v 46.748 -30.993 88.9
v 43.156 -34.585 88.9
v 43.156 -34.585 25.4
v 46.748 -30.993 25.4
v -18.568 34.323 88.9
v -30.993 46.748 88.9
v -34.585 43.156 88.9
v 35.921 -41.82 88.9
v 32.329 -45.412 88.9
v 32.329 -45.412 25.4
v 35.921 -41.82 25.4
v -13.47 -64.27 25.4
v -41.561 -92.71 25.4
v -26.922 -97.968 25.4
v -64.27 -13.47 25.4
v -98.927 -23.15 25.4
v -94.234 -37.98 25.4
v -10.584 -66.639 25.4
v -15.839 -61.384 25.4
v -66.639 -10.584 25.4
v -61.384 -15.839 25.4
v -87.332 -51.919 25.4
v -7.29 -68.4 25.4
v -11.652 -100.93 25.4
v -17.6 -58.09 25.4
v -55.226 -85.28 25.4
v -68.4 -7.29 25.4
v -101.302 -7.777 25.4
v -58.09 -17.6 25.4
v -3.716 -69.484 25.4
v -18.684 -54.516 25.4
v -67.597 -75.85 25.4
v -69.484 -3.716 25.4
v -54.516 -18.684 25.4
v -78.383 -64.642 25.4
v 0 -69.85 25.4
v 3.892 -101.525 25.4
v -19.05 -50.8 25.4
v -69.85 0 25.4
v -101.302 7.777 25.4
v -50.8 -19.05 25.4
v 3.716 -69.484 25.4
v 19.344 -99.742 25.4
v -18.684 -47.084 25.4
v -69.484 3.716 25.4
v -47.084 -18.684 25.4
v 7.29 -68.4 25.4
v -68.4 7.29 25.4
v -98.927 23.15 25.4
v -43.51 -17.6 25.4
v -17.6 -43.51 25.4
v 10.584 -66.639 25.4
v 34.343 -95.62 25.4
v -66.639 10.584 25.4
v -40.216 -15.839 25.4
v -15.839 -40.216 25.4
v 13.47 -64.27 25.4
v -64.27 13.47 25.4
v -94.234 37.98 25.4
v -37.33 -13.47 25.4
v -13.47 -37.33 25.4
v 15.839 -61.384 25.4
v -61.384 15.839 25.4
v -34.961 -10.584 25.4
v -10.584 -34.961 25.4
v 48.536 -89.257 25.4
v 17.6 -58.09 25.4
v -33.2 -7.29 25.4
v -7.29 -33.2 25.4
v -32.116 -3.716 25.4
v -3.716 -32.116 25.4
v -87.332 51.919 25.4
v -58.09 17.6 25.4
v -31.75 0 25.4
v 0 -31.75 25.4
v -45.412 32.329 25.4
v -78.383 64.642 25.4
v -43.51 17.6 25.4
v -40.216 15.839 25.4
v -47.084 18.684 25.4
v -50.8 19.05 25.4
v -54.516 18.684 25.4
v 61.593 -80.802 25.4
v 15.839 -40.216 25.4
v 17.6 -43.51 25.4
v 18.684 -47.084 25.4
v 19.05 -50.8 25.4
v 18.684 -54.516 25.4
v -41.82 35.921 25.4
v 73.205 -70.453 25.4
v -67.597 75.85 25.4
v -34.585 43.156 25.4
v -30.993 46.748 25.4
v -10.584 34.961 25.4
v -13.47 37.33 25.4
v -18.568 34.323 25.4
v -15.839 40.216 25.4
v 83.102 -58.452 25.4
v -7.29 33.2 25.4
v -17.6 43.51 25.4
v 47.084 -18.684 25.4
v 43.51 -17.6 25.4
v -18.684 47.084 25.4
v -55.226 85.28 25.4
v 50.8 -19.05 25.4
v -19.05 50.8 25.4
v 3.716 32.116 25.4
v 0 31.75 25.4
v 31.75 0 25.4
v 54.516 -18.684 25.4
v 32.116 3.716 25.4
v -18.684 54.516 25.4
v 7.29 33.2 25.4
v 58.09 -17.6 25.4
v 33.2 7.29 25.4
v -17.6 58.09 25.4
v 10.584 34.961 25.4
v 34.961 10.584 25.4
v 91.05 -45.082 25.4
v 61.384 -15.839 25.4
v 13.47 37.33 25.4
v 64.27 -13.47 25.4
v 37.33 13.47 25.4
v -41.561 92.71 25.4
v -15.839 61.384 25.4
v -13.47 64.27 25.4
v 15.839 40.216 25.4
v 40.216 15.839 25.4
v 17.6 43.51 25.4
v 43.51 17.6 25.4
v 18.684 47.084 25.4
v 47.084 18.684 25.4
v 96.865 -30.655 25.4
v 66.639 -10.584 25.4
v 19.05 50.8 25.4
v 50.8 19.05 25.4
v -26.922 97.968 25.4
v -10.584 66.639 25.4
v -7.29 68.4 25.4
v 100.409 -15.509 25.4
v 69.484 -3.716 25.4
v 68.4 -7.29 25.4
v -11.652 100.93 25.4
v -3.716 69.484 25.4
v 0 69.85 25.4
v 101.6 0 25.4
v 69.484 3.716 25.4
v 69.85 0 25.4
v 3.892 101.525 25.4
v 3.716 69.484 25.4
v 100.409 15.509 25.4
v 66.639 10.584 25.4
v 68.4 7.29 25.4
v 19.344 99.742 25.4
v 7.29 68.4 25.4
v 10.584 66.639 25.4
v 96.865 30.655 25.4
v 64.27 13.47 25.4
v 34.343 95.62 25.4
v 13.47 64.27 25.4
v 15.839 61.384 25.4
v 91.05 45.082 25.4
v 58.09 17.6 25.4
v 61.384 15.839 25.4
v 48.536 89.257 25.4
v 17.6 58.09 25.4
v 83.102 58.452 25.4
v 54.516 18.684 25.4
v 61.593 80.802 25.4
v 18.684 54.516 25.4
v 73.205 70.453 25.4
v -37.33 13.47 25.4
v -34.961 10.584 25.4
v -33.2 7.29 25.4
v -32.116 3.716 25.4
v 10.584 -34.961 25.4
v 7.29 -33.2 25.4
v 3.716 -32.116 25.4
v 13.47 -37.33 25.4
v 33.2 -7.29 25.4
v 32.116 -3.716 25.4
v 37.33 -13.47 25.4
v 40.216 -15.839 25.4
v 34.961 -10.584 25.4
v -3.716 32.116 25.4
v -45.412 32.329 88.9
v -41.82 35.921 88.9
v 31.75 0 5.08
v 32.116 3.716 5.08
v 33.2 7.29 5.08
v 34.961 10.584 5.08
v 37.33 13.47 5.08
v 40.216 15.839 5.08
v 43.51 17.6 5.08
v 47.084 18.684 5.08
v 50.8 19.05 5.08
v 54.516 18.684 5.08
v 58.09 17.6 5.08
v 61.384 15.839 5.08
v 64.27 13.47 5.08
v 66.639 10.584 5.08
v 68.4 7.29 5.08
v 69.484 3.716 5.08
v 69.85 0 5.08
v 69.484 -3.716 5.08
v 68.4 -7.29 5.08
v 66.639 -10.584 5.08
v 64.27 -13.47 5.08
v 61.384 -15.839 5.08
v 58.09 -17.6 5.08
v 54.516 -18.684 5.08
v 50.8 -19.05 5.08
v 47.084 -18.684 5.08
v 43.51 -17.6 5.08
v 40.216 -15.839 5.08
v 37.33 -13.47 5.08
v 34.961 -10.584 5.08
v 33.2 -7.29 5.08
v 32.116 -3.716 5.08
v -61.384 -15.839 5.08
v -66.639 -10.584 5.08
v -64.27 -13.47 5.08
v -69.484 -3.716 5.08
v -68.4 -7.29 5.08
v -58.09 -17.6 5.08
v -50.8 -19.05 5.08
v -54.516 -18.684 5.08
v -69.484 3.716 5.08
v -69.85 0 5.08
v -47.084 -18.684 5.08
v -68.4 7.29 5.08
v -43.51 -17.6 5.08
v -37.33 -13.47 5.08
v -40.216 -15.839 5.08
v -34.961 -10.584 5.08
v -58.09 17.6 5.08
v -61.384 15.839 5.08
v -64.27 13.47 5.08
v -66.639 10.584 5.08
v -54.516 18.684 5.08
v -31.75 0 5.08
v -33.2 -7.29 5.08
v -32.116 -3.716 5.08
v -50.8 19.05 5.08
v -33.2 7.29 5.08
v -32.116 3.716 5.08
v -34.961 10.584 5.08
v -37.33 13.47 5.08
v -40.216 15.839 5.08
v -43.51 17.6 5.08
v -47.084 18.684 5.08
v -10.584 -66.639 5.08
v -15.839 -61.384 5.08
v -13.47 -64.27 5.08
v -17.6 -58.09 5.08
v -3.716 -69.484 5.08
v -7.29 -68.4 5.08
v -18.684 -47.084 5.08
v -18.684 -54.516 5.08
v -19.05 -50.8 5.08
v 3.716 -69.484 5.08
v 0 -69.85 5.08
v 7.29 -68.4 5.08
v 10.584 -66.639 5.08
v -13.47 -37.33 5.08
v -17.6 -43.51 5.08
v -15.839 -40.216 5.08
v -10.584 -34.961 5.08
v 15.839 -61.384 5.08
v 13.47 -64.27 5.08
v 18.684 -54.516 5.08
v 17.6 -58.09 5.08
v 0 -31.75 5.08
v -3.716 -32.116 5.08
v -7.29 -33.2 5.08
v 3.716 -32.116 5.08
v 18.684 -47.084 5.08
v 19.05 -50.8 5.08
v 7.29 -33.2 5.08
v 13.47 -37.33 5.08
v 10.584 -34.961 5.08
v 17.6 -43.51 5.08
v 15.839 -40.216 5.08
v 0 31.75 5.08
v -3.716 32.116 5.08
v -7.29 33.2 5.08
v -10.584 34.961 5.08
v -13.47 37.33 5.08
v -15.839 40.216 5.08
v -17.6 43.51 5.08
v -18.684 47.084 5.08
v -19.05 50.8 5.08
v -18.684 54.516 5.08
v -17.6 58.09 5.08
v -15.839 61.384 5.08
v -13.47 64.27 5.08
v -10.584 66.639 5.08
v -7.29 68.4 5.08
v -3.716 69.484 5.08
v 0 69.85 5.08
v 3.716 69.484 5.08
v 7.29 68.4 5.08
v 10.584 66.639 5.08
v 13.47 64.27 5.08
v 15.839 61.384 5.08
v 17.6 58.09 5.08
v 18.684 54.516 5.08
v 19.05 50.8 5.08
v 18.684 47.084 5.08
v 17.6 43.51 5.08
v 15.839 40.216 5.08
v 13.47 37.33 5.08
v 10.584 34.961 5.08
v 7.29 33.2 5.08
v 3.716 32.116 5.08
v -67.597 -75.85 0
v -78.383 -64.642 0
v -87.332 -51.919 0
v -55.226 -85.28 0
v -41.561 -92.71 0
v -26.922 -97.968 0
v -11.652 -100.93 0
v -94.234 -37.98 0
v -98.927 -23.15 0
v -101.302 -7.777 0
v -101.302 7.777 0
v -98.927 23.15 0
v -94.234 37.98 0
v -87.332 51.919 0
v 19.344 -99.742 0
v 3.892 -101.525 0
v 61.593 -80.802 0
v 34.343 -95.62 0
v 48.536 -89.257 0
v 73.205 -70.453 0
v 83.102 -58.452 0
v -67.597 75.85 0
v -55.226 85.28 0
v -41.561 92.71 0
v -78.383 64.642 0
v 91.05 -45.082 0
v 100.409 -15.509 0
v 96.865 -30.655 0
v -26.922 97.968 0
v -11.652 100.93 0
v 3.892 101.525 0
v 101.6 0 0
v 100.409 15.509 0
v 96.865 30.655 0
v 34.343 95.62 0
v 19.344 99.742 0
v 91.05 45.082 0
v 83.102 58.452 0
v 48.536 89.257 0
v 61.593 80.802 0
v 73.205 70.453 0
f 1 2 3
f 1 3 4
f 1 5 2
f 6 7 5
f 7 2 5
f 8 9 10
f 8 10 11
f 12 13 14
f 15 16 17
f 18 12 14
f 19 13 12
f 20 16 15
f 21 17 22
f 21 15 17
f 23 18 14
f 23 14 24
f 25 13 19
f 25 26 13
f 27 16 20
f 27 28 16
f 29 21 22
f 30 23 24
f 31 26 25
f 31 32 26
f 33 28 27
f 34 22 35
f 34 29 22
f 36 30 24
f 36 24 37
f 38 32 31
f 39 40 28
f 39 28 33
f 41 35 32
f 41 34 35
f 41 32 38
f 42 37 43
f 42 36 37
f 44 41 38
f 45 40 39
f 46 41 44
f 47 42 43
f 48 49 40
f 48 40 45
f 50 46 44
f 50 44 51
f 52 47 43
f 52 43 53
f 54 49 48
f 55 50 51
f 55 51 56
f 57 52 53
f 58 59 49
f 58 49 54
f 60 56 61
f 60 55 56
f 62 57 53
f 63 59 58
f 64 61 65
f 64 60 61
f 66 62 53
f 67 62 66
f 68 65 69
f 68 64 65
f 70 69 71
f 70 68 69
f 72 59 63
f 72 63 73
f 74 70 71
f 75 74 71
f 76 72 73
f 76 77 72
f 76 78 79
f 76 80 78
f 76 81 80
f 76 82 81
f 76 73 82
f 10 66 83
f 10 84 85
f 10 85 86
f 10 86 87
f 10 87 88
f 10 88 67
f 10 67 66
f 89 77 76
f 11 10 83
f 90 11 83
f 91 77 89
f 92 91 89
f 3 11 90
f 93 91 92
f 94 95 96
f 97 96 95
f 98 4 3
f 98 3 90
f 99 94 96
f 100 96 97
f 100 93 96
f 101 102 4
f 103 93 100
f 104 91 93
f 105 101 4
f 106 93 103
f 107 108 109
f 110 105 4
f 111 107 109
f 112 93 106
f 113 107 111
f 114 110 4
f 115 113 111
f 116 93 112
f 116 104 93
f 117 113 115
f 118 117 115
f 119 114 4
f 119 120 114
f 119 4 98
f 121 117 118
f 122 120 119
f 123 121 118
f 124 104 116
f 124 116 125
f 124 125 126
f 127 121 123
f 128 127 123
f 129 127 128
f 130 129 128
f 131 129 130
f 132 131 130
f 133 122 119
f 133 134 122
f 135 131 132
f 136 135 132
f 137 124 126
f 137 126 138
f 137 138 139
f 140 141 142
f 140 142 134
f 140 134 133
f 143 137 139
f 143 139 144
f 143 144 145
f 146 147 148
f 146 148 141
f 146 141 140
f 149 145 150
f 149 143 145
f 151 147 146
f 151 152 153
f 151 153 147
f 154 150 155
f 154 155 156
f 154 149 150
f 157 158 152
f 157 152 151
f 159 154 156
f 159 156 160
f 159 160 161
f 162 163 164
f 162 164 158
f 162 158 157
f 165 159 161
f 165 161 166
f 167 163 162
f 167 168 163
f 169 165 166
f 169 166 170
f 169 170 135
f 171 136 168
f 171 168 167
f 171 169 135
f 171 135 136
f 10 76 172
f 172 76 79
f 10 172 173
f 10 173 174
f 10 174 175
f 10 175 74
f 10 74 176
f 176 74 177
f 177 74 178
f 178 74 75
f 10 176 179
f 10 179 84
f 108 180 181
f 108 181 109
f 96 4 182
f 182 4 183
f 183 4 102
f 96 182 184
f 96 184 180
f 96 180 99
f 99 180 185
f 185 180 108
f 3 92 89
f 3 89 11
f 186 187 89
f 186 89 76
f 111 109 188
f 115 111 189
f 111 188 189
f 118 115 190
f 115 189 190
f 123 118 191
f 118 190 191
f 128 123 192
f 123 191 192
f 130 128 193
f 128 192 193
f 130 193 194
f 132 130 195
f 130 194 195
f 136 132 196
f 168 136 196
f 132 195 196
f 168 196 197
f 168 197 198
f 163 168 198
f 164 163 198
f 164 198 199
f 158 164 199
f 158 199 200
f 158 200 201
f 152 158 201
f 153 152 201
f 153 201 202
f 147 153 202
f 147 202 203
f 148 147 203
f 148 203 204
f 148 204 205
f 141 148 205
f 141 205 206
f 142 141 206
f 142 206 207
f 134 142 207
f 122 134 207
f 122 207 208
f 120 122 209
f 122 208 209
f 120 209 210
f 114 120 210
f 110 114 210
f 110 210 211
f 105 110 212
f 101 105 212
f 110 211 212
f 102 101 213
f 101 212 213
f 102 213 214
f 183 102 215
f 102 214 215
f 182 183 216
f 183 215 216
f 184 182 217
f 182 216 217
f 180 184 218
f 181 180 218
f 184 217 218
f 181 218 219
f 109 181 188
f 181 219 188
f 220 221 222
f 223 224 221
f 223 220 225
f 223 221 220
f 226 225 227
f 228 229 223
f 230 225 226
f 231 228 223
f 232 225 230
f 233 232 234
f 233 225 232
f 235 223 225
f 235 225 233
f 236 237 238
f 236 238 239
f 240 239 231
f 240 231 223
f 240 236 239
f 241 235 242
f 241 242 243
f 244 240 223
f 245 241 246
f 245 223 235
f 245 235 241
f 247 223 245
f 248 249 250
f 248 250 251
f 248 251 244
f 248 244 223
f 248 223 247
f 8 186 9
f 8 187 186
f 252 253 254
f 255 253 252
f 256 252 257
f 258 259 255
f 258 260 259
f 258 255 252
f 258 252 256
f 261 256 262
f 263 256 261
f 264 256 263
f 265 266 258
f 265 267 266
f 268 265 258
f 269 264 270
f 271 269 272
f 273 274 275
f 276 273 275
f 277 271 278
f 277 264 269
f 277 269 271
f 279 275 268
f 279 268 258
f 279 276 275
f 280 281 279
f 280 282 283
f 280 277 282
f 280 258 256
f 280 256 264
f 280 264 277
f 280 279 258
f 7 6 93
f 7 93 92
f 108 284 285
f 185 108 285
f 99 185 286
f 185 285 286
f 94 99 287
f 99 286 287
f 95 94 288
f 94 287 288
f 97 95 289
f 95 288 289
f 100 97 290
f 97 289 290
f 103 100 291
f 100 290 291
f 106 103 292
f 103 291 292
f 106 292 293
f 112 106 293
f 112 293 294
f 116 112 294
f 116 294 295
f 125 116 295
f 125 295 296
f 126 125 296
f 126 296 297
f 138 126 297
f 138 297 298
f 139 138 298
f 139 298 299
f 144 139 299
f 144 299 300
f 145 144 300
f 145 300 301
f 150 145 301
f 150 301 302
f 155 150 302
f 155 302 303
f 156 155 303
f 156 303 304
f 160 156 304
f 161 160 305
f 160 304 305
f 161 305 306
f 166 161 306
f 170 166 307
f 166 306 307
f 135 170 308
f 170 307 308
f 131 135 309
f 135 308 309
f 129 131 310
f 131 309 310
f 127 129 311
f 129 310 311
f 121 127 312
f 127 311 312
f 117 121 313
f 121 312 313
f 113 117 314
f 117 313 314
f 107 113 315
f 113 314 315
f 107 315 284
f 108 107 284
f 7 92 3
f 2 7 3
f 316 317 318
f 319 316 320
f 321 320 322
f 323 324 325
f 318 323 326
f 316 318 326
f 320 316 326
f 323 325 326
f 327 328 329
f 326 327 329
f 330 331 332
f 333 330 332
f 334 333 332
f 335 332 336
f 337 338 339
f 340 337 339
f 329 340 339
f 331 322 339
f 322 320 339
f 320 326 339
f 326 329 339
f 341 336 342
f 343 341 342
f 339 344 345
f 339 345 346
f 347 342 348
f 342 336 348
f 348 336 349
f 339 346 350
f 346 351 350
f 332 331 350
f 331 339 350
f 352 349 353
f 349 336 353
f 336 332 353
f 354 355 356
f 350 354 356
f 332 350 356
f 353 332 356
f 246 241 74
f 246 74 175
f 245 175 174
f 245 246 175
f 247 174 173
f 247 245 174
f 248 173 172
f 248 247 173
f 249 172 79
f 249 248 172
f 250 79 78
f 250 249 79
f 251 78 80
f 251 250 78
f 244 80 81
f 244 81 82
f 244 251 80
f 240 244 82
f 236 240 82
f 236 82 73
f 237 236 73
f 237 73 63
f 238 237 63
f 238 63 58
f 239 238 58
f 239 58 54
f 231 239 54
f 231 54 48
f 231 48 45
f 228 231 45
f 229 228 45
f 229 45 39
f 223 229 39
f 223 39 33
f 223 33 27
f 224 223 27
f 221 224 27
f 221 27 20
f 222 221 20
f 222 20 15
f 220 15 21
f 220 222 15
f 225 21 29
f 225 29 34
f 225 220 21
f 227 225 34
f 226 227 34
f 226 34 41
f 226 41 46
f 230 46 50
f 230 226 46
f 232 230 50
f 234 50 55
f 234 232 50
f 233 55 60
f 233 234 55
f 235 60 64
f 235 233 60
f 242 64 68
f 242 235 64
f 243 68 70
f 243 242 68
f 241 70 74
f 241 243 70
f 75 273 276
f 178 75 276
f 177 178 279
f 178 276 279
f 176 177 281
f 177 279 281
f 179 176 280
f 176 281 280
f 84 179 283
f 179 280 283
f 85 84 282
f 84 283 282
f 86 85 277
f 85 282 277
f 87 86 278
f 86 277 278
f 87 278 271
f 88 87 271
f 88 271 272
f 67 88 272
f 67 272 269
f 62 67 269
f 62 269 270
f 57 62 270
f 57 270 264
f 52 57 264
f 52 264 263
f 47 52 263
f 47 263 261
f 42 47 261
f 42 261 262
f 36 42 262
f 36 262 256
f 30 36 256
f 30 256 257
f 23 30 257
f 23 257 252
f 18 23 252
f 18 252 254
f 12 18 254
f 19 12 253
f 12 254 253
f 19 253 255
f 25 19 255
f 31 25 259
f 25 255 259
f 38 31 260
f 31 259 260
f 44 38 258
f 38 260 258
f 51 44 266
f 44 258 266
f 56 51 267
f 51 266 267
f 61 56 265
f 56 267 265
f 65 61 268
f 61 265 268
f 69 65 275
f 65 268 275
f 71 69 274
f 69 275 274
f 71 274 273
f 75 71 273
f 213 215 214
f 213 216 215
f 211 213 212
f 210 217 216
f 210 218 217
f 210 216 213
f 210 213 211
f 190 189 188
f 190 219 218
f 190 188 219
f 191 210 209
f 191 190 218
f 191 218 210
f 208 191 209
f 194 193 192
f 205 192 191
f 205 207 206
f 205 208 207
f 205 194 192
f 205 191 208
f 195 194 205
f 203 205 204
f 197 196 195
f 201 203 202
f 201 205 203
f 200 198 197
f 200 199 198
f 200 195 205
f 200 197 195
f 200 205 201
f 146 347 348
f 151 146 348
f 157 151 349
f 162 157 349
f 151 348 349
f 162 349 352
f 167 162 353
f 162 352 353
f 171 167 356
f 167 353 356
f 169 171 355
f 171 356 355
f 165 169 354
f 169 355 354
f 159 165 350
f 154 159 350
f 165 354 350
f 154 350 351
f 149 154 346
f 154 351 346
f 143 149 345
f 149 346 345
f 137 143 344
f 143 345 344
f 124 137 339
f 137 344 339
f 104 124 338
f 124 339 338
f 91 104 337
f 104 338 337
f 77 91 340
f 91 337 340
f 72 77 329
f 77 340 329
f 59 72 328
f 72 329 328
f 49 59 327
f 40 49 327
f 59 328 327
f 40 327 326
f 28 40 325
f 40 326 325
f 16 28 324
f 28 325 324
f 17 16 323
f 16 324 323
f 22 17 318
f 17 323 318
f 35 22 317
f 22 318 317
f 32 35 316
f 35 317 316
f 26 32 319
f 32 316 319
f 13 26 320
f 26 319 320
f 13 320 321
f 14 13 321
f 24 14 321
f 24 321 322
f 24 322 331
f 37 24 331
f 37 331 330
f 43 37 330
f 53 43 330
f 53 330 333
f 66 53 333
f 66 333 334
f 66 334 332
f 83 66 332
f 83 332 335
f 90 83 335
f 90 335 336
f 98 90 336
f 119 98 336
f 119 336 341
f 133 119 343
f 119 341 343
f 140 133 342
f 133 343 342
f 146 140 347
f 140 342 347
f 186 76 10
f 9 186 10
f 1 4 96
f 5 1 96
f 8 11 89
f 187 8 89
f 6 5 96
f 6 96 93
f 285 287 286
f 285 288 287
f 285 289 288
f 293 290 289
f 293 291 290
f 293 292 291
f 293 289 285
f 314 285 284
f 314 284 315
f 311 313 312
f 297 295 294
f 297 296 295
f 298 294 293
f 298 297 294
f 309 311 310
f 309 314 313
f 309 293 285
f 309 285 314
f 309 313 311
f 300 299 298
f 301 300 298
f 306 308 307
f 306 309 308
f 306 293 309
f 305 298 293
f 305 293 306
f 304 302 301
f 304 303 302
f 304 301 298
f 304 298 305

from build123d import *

# Parameters (mm, degrees)
F0_R     = 101.6
F0_R_2   = 19.05
F1_DEPTH = 25.4
F2_R     = 19.05
F3_DEPTH = 5.08
F5_DEPTH = 63.5


with BuildPart() as f1:
    # F0 (on Top) → F1 (new body)
    with BuildSketch(Plane.XY):
        Circle(F0_R)
        with BuildLine():
            ThreePointArc((19.05, -50.8), (-13.4703841816, -64.2703841816), (0, -31.75))
            ThreePointArc((0, -31.75), (13.4703841816, -37.3296158184), (19.05, -50.8))
        make_face(mode=Mode.SUBTRACT)
        with Locations((-50.8, 0)):
            Circle(F0_R_2, mode=Mode.SUBTRACT)
        with BuildLine():
            ThreePointArc((69.85, 0), (50.8, -19.05), (31.75, 0))
            ThreePointArc((31.75, 0), (50.8, 19.05), (69.85, 0))
        make_face(mode=Mode.SUBTRACT)
        with BuildLine():
            ThreePointArc((19.05, 50.8), (13.4703841816, 37.3296158184), (0, 31.75))
            ThreePointArc((0, 31.75), (-13.4703841816, 64.2703841816), (19.05, 50.8))
        make_face(mode=Mode.SUBTRACT)
    extrude(amount=F1_DEPTH)

    # F2 (on Top) → F3 (join)
    with BuildSketch(Plane.XY):
        with Locations((-50.8, 0)):
            Circle(F2_R)
        with Locations((0, -50.8)):
            Circle(F2_R)
        with Locations((0, 50.8)):
            Circle(F2_R)
        with Locations((50.8, 0)):
            Circle(F2_R)
    extrude(amount=F3_DEPTH)

    # F4 (on face) → F5 (join)
    with BuildSketch(Plane.XY.offset(25.4)):
        Polygon((-45.4118463274, 32.3289220358), (-31.9414621458, 18.8585378542), (32.3289220358, -45.4118463274), (35.9210244843, -41.8197438789), (-41.8197438789, 35.9210244843), align=None)
        Polygon((46.7480724009, -30.9926959623), (-18.5676223436, 34.3229987821), (-30.9926959623, 46.7480724009), (-34.5847984107, 43.1559699525), (43.1559699525, -34.5847984107), align=None)
    extrude(amount=F5_DEPTH)


solid = f1.part
